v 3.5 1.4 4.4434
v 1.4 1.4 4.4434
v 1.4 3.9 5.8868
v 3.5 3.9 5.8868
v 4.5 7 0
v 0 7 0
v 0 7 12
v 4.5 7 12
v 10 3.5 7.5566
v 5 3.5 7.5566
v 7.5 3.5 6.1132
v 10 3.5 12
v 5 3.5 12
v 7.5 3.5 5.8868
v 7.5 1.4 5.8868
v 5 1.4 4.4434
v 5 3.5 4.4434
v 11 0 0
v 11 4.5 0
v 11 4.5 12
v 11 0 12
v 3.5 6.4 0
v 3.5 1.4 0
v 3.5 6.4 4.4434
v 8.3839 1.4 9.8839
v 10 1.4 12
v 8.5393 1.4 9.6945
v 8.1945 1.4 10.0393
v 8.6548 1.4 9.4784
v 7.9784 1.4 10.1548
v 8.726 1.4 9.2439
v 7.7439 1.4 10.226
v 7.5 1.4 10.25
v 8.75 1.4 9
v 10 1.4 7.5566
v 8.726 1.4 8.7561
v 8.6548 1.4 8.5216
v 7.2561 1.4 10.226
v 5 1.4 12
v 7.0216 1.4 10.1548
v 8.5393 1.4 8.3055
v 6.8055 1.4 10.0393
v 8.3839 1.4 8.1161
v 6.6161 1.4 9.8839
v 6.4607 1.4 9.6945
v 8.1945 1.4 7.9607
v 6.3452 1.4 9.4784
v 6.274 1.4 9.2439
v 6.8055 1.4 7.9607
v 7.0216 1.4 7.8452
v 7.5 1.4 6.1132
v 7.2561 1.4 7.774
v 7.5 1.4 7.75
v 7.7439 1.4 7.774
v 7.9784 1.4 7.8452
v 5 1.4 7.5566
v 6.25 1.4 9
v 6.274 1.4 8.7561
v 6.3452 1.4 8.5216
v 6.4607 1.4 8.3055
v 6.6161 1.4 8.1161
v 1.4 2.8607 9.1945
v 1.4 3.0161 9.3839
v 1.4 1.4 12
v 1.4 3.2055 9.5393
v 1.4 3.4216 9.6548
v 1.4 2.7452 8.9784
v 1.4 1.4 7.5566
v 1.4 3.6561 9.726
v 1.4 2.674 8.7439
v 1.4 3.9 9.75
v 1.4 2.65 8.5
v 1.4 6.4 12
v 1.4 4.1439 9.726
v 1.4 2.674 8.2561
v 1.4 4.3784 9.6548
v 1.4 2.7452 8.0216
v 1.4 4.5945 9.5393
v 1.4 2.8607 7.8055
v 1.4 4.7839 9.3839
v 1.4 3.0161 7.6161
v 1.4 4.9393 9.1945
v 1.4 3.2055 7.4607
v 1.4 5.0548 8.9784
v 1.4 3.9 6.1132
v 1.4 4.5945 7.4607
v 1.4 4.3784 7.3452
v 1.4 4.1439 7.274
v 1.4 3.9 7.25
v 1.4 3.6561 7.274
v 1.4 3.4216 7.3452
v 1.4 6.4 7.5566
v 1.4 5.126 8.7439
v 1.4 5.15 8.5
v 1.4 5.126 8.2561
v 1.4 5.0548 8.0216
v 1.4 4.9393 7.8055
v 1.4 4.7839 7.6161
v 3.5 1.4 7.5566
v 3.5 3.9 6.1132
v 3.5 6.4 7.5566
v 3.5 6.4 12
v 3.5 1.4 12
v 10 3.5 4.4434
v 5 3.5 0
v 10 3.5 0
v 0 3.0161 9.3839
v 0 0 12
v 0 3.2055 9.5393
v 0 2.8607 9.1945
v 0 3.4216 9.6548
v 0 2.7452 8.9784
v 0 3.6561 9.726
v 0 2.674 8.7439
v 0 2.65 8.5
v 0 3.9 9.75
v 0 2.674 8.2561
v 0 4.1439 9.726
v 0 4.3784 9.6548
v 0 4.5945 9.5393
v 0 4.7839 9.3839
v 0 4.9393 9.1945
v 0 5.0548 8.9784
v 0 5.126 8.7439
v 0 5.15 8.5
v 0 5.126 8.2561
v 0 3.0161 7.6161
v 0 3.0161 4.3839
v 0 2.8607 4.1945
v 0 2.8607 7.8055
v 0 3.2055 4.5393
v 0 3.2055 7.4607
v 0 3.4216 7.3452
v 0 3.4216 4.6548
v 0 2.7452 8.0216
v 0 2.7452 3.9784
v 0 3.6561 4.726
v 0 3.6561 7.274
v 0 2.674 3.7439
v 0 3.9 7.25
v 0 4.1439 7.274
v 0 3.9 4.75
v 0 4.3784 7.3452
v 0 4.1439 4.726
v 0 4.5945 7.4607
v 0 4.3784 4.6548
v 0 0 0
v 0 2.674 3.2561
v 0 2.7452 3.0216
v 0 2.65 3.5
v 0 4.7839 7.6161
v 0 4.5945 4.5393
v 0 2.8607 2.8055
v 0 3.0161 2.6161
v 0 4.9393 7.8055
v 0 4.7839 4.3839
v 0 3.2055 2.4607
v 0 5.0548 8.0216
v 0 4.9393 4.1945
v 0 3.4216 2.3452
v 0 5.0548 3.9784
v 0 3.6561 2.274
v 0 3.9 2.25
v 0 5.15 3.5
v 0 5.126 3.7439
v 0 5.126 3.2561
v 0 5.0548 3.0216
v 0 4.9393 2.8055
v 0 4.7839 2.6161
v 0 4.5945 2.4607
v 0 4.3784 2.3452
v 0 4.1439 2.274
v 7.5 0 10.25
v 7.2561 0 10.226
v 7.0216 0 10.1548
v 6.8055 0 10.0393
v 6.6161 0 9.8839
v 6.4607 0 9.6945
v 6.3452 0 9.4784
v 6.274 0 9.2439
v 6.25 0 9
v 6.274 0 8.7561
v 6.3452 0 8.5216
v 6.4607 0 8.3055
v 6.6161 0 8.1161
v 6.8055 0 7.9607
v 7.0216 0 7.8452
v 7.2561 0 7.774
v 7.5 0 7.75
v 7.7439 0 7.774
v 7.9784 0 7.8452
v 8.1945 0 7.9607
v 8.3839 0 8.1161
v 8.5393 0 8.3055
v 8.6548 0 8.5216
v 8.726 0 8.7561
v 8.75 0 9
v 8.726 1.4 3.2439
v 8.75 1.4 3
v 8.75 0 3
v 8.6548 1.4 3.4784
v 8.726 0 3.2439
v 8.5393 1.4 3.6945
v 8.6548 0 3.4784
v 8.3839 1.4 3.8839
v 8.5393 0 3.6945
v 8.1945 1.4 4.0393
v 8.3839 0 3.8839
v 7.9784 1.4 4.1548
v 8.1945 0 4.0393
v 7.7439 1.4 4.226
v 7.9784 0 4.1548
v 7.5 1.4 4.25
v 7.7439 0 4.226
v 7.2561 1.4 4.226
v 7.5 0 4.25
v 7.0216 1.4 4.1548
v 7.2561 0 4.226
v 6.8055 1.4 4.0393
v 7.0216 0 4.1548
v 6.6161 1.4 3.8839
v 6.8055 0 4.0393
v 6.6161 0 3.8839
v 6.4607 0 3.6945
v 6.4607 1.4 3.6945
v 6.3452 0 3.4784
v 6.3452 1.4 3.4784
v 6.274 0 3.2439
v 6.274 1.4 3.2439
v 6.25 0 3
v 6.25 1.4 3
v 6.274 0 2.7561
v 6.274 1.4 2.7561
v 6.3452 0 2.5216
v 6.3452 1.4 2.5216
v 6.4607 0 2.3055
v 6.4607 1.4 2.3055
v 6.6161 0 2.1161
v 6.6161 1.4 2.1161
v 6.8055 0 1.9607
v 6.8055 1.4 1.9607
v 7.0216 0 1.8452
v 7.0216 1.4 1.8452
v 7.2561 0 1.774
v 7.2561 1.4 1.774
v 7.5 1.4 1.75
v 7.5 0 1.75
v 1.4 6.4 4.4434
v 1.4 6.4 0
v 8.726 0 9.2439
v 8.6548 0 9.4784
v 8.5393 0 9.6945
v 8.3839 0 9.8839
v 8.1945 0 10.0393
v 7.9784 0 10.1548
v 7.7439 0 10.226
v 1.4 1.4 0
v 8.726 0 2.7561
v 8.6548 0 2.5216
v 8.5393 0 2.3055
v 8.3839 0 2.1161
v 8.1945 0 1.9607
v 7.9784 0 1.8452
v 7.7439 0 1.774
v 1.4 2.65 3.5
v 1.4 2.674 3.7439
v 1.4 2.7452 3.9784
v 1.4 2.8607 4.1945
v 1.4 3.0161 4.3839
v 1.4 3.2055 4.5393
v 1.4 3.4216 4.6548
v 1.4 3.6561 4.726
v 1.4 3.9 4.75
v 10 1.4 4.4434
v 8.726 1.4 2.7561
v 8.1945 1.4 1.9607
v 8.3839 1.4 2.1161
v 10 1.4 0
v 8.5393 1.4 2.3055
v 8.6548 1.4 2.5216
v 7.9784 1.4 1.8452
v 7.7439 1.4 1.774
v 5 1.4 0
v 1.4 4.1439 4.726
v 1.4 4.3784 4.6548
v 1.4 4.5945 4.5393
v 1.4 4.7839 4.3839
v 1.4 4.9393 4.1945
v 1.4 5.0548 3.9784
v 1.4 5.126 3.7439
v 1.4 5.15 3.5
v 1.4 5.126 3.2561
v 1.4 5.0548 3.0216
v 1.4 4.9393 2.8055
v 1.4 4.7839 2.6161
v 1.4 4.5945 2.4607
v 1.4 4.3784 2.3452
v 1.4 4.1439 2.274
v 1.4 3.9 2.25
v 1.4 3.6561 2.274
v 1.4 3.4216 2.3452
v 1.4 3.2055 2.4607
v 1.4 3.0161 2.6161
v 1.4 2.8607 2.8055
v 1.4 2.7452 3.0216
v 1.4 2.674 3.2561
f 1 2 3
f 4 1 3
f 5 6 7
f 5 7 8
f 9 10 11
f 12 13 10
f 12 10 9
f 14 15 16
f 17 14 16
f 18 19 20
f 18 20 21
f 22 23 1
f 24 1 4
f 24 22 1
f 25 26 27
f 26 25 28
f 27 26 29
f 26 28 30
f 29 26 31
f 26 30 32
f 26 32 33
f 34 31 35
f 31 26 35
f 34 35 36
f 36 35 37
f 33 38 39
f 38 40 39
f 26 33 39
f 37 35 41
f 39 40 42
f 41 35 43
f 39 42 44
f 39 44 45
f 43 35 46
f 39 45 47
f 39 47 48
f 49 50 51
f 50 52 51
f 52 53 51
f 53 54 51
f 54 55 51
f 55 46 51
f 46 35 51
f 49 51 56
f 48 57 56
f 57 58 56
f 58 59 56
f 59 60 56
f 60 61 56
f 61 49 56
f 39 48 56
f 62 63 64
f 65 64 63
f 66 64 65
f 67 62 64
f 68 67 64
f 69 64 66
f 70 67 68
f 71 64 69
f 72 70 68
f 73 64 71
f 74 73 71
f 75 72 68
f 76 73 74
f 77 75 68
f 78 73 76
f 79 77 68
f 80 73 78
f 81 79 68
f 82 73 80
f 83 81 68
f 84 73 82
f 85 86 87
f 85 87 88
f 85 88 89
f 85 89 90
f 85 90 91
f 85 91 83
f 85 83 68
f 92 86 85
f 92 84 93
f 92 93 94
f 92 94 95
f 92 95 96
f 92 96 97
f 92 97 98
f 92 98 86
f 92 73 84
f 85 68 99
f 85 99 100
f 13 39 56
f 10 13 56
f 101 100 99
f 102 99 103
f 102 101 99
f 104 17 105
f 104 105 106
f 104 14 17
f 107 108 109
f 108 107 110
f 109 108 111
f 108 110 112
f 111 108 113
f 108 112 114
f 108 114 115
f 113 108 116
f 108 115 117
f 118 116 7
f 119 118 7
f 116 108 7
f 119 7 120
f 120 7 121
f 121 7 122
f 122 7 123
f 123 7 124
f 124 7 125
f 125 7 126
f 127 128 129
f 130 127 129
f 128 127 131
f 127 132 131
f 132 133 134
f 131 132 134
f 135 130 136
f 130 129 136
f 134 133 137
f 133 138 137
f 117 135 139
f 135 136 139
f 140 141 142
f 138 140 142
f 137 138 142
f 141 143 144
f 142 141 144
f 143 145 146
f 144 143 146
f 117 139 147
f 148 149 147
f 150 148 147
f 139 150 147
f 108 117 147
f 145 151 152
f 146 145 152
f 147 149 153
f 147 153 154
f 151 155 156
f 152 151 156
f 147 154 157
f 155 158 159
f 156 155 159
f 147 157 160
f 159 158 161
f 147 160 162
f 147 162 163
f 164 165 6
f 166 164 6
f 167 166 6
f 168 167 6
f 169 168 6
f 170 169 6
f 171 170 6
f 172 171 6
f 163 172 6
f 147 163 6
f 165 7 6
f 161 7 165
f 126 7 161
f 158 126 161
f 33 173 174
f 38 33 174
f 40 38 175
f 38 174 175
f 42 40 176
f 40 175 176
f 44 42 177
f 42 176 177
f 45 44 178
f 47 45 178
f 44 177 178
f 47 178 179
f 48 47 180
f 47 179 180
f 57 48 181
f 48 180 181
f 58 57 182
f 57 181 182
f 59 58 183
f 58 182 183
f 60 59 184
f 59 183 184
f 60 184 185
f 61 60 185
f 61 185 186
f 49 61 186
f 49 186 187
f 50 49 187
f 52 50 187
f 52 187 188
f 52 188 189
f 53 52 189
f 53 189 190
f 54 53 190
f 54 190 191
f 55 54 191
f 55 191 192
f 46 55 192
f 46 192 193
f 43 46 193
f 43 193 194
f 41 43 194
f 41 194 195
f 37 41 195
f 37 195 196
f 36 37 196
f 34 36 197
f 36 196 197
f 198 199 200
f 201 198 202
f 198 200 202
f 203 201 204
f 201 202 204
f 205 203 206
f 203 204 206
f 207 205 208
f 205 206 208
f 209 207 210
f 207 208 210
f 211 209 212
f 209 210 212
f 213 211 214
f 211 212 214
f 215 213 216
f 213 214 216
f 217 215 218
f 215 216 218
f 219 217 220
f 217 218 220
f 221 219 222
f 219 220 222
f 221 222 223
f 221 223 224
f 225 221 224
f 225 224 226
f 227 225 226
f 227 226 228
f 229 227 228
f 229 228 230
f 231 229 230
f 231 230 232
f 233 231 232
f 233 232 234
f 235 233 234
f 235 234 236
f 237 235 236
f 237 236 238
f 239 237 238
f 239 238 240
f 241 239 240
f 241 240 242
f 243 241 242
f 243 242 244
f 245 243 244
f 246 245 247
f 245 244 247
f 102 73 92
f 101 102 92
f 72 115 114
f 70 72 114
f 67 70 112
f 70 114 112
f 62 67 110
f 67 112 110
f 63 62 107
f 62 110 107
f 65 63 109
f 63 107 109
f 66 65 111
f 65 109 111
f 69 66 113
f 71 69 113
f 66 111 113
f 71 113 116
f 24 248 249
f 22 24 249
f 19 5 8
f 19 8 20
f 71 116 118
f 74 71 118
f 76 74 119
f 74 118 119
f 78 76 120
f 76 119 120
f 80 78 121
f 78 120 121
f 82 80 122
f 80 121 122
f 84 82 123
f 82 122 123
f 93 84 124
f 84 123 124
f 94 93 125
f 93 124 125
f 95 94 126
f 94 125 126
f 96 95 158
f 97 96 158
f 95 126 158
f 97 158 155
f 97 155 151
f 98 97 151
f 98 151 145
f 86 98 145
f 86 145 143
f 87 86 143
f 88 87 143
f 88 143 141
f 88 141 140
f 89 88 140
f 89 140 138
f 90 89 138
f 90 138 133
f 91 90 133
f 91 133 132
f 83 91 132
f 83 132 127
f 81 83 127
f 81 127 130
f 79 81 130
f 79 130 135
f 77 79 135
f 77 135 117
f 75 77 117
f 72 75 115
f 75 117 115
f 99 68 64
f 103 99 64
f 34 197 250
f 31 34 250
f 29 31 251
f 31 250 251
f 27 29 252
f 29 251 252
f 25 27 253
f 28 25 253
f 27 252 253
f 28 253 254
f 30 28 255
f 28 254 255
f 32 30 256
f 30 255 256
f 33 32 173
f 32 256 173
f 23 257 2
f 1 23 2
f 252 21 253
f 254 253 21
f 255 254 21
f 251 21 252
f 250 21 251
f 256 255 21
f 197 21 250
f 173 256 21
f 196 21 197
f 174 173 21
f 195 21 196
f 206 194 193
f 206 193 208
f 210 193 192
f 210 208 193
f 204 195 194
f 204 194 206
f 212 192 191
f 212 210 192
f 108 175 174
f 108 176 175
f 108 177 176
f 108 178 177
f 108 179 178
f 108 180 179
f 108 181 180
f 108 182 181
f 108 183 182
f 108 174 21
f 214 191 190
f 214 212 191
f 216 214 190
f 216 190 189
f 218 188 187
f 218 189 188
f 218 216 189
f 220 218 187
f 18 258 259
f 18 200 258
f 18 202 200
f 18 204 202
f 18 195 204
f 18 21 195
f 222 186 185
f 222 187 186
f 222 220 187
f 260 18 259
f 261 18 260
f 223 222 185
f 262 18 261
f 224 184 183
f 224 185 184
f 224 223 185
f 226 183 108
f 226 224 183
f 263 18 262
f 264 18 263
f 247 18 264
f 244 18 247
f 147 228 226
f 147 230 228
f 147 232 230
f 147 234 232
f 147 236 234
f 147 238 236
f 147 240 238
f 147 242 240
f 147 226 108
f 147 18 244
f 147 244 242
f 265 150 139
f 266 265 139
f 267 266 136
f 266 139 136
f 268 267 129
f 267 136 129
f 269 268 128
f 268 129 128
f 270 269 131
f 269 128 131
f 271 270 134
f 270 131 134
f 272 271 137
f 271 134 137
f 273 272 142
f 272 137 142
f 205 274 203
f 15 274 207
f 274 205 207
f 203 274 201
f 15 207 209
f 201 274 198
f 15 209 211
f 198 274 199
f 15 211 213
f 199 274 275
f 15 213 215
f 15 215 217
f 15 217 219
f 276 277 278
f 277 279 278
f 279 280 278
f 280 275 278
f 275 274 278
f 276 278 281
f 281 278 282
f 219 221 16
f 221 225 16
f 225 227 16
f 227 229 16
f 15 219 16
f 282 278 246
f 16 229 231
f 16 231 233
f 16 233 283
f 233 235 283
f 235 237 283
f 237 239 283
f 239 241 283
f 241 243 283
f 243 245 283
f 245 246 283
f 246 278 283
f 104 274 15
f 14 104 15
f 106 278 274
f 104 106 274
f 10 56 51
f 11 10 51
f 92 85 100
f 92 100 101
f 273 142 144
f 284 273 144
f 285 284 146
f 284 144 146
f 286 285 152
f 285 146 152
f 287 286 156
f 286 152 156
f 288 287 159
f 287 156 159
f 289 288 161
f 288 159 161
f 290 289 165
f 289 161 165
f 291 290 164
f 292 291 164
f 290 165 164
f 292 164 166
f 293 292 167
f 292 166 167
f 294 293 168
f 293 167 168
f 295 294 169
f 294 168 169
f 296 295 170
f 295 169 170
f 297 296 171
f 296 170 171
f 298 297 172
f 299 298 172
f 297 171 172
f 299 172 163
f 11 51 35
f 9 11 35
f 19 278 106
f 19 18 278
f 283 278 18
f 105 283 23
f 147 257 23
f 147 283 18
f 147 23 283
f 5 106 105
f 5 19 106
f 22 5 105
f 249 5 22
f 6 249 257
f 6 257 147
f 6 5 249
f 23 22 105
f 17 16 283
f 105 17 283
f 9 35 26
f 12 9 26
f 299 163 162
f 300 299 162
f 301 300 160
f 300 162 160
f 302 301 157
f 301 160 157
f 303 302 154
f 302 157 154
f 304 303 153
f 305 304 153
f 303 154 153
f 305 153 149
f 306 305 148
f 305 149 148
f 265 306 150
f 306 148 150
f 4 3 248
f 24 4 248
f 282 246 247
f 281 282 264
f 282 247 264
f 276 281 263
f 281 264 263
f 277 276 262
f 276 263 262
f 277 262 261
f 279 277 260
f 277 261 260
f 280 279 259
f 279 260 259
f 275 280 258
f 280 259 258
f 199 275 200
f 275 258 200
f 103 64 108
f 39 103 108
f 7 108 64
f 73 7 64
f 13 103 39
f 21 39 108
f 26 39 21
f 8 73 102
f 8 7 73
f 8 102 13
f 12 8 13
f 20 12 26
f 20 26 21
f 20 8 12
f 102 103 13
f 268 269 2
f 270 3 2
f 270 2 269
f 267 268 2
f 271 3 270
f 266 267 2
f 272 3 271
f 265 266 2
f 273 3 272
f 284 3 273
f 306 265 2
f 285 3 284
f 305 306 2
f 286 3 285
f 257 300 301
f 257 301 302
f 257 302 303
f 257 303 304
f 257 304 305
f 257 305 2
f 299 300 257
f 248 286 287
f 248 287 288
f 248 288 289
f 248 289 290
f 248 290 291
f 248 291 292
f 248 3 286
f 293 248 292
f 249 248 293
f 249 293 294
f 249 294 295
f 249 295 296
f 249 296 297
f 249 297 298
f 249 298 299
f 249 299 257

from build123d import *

# Parameters (mm, degrees)
BOSS_EXTRUDE1_DEPTH = 12
CUT_EXTRUDE1_DEPTH  = 3.5
SKETCH3_W           = 1.4
SKETCH3_H           = 12
BOSS_EXTRUDE2_DEPTH = 7
SKETCH4_R           = 1.25
CUT_EXTRUDE2_DEPTH  = 3.5
SKETCH5_W           = 7
SKETCH5_H           = 1.4
BOSS_EXTRUDE3_DEPTH = 12
SKETCH6_R           = 1.25
CUT_EXTRUDE3_DEPTH  = 3.5
SKETCH4_3_R         = 1.25
CUT_EXTRUDE4_DEPTH  = 3.5


with BuildPart() as part:
    # Sketch1 → Boss-Extrude1 (new body)
    with BuildSketch(Plane.XY):
        Polygon((0, 0), (0, 7), (4.5, 7), (11, 4.5), (11, 0), align=None)
    extrude(amount=BOSS_EXTRUDE1_DEPTH)

    # Sketch2 → Cut-Extrude1 (cut)
    with BuildSketch(Plane.ZY):
        Polygon((5.886751346, 3.9), (4.443375673, 6.4), (0, 6.4), (0, 1.4), (4.443375673, 1.4), align=None)
        Polygon((7.556624327, 6.4), (6.113248654, 3.9), (7.556624327, 1.4), (12, 1.4), (12, 6.4), align=None)
    extrude(amount=-CUT_EXTRUDE1_DEPTH, mode=Mode.SUBTRACT)

    # Sketch3 → Boss-Extrude2 (add)
    with BuildSketch(Plane(origin=(0, 7, 0), x_dir=(1, 0, 0), z_dir=(0, 1, 0))):
        with Locations((0.7, -6)):
            Rectangle(SKETCH3_W, SKETCH3_H)
    extrude(amount=-BOSS_EXTRUDE2_DEPTH)

    # Sketch4 → Cut-Extrude2 (cut)
    # profile 1 of 2: a face of its own
    with BuildSketch(Plane.XZ):
        Polygon((7.5, 6.113248654), (10, 7.556624327), (10, 12), (5, 12), (5, 7.556624327), align=None)
    # profile 2 of 2: a face of its own
    with BuildSketch(Plane.XZ):
        Polygon((7.5, 5.886751346), (5, 4.443375673), (5, 0), (10, 0), (10, 4.443375673), align=None)
        with Locations((7.5, 3)):
            Circle(SKETCH4_R, mode=Mode.SUBTRACT)
    extrude(amount=-CUT_EXTRUDE2_DEPTH, mode=Mode.SUBTRACT)

    # Sketch5 → Boss-Extrude3 (add)
    with BuildSketch(Plane(origin=(0, 0, 0), x_dir=(-1, 0, 0), z_dir=(0, 0, -1))):
        with Locations((-7.5, 0.7)):
            Rectangle(SKETCH5_W, SKETCH5_H)
    extrude(amount=-BOSS_EXTRUDE3_DEPTH)

    # Sketch6 → Cut-Extrude3 (cut)
    with BuildSketch(Plane.ZY):
        with Locations((3.5, 3.9)):
            Circle(SKETCH6_R)
        with Locations((8.5, 3.9)):
            Circle(SKETCH6_R)
    extrude(amount=-CUT_EXTRUDE3_DEPTH, mode=Mode.SUBTRACT)

    # Sketch4<3> → Cut-Extrude4 (cut)
    with BuildSketch(Plane.XZ):
        with Locations((7.5, 9)):
            Circle(SKETCH4_3_R)
        with Locations((7.5, 3)):
            Circle(SKETCH4_3_R)
    extrude(amount=-CUT_EXTRUDE4_DEPTH, mode=Mode.SUBTRACT)


solid = part.part
